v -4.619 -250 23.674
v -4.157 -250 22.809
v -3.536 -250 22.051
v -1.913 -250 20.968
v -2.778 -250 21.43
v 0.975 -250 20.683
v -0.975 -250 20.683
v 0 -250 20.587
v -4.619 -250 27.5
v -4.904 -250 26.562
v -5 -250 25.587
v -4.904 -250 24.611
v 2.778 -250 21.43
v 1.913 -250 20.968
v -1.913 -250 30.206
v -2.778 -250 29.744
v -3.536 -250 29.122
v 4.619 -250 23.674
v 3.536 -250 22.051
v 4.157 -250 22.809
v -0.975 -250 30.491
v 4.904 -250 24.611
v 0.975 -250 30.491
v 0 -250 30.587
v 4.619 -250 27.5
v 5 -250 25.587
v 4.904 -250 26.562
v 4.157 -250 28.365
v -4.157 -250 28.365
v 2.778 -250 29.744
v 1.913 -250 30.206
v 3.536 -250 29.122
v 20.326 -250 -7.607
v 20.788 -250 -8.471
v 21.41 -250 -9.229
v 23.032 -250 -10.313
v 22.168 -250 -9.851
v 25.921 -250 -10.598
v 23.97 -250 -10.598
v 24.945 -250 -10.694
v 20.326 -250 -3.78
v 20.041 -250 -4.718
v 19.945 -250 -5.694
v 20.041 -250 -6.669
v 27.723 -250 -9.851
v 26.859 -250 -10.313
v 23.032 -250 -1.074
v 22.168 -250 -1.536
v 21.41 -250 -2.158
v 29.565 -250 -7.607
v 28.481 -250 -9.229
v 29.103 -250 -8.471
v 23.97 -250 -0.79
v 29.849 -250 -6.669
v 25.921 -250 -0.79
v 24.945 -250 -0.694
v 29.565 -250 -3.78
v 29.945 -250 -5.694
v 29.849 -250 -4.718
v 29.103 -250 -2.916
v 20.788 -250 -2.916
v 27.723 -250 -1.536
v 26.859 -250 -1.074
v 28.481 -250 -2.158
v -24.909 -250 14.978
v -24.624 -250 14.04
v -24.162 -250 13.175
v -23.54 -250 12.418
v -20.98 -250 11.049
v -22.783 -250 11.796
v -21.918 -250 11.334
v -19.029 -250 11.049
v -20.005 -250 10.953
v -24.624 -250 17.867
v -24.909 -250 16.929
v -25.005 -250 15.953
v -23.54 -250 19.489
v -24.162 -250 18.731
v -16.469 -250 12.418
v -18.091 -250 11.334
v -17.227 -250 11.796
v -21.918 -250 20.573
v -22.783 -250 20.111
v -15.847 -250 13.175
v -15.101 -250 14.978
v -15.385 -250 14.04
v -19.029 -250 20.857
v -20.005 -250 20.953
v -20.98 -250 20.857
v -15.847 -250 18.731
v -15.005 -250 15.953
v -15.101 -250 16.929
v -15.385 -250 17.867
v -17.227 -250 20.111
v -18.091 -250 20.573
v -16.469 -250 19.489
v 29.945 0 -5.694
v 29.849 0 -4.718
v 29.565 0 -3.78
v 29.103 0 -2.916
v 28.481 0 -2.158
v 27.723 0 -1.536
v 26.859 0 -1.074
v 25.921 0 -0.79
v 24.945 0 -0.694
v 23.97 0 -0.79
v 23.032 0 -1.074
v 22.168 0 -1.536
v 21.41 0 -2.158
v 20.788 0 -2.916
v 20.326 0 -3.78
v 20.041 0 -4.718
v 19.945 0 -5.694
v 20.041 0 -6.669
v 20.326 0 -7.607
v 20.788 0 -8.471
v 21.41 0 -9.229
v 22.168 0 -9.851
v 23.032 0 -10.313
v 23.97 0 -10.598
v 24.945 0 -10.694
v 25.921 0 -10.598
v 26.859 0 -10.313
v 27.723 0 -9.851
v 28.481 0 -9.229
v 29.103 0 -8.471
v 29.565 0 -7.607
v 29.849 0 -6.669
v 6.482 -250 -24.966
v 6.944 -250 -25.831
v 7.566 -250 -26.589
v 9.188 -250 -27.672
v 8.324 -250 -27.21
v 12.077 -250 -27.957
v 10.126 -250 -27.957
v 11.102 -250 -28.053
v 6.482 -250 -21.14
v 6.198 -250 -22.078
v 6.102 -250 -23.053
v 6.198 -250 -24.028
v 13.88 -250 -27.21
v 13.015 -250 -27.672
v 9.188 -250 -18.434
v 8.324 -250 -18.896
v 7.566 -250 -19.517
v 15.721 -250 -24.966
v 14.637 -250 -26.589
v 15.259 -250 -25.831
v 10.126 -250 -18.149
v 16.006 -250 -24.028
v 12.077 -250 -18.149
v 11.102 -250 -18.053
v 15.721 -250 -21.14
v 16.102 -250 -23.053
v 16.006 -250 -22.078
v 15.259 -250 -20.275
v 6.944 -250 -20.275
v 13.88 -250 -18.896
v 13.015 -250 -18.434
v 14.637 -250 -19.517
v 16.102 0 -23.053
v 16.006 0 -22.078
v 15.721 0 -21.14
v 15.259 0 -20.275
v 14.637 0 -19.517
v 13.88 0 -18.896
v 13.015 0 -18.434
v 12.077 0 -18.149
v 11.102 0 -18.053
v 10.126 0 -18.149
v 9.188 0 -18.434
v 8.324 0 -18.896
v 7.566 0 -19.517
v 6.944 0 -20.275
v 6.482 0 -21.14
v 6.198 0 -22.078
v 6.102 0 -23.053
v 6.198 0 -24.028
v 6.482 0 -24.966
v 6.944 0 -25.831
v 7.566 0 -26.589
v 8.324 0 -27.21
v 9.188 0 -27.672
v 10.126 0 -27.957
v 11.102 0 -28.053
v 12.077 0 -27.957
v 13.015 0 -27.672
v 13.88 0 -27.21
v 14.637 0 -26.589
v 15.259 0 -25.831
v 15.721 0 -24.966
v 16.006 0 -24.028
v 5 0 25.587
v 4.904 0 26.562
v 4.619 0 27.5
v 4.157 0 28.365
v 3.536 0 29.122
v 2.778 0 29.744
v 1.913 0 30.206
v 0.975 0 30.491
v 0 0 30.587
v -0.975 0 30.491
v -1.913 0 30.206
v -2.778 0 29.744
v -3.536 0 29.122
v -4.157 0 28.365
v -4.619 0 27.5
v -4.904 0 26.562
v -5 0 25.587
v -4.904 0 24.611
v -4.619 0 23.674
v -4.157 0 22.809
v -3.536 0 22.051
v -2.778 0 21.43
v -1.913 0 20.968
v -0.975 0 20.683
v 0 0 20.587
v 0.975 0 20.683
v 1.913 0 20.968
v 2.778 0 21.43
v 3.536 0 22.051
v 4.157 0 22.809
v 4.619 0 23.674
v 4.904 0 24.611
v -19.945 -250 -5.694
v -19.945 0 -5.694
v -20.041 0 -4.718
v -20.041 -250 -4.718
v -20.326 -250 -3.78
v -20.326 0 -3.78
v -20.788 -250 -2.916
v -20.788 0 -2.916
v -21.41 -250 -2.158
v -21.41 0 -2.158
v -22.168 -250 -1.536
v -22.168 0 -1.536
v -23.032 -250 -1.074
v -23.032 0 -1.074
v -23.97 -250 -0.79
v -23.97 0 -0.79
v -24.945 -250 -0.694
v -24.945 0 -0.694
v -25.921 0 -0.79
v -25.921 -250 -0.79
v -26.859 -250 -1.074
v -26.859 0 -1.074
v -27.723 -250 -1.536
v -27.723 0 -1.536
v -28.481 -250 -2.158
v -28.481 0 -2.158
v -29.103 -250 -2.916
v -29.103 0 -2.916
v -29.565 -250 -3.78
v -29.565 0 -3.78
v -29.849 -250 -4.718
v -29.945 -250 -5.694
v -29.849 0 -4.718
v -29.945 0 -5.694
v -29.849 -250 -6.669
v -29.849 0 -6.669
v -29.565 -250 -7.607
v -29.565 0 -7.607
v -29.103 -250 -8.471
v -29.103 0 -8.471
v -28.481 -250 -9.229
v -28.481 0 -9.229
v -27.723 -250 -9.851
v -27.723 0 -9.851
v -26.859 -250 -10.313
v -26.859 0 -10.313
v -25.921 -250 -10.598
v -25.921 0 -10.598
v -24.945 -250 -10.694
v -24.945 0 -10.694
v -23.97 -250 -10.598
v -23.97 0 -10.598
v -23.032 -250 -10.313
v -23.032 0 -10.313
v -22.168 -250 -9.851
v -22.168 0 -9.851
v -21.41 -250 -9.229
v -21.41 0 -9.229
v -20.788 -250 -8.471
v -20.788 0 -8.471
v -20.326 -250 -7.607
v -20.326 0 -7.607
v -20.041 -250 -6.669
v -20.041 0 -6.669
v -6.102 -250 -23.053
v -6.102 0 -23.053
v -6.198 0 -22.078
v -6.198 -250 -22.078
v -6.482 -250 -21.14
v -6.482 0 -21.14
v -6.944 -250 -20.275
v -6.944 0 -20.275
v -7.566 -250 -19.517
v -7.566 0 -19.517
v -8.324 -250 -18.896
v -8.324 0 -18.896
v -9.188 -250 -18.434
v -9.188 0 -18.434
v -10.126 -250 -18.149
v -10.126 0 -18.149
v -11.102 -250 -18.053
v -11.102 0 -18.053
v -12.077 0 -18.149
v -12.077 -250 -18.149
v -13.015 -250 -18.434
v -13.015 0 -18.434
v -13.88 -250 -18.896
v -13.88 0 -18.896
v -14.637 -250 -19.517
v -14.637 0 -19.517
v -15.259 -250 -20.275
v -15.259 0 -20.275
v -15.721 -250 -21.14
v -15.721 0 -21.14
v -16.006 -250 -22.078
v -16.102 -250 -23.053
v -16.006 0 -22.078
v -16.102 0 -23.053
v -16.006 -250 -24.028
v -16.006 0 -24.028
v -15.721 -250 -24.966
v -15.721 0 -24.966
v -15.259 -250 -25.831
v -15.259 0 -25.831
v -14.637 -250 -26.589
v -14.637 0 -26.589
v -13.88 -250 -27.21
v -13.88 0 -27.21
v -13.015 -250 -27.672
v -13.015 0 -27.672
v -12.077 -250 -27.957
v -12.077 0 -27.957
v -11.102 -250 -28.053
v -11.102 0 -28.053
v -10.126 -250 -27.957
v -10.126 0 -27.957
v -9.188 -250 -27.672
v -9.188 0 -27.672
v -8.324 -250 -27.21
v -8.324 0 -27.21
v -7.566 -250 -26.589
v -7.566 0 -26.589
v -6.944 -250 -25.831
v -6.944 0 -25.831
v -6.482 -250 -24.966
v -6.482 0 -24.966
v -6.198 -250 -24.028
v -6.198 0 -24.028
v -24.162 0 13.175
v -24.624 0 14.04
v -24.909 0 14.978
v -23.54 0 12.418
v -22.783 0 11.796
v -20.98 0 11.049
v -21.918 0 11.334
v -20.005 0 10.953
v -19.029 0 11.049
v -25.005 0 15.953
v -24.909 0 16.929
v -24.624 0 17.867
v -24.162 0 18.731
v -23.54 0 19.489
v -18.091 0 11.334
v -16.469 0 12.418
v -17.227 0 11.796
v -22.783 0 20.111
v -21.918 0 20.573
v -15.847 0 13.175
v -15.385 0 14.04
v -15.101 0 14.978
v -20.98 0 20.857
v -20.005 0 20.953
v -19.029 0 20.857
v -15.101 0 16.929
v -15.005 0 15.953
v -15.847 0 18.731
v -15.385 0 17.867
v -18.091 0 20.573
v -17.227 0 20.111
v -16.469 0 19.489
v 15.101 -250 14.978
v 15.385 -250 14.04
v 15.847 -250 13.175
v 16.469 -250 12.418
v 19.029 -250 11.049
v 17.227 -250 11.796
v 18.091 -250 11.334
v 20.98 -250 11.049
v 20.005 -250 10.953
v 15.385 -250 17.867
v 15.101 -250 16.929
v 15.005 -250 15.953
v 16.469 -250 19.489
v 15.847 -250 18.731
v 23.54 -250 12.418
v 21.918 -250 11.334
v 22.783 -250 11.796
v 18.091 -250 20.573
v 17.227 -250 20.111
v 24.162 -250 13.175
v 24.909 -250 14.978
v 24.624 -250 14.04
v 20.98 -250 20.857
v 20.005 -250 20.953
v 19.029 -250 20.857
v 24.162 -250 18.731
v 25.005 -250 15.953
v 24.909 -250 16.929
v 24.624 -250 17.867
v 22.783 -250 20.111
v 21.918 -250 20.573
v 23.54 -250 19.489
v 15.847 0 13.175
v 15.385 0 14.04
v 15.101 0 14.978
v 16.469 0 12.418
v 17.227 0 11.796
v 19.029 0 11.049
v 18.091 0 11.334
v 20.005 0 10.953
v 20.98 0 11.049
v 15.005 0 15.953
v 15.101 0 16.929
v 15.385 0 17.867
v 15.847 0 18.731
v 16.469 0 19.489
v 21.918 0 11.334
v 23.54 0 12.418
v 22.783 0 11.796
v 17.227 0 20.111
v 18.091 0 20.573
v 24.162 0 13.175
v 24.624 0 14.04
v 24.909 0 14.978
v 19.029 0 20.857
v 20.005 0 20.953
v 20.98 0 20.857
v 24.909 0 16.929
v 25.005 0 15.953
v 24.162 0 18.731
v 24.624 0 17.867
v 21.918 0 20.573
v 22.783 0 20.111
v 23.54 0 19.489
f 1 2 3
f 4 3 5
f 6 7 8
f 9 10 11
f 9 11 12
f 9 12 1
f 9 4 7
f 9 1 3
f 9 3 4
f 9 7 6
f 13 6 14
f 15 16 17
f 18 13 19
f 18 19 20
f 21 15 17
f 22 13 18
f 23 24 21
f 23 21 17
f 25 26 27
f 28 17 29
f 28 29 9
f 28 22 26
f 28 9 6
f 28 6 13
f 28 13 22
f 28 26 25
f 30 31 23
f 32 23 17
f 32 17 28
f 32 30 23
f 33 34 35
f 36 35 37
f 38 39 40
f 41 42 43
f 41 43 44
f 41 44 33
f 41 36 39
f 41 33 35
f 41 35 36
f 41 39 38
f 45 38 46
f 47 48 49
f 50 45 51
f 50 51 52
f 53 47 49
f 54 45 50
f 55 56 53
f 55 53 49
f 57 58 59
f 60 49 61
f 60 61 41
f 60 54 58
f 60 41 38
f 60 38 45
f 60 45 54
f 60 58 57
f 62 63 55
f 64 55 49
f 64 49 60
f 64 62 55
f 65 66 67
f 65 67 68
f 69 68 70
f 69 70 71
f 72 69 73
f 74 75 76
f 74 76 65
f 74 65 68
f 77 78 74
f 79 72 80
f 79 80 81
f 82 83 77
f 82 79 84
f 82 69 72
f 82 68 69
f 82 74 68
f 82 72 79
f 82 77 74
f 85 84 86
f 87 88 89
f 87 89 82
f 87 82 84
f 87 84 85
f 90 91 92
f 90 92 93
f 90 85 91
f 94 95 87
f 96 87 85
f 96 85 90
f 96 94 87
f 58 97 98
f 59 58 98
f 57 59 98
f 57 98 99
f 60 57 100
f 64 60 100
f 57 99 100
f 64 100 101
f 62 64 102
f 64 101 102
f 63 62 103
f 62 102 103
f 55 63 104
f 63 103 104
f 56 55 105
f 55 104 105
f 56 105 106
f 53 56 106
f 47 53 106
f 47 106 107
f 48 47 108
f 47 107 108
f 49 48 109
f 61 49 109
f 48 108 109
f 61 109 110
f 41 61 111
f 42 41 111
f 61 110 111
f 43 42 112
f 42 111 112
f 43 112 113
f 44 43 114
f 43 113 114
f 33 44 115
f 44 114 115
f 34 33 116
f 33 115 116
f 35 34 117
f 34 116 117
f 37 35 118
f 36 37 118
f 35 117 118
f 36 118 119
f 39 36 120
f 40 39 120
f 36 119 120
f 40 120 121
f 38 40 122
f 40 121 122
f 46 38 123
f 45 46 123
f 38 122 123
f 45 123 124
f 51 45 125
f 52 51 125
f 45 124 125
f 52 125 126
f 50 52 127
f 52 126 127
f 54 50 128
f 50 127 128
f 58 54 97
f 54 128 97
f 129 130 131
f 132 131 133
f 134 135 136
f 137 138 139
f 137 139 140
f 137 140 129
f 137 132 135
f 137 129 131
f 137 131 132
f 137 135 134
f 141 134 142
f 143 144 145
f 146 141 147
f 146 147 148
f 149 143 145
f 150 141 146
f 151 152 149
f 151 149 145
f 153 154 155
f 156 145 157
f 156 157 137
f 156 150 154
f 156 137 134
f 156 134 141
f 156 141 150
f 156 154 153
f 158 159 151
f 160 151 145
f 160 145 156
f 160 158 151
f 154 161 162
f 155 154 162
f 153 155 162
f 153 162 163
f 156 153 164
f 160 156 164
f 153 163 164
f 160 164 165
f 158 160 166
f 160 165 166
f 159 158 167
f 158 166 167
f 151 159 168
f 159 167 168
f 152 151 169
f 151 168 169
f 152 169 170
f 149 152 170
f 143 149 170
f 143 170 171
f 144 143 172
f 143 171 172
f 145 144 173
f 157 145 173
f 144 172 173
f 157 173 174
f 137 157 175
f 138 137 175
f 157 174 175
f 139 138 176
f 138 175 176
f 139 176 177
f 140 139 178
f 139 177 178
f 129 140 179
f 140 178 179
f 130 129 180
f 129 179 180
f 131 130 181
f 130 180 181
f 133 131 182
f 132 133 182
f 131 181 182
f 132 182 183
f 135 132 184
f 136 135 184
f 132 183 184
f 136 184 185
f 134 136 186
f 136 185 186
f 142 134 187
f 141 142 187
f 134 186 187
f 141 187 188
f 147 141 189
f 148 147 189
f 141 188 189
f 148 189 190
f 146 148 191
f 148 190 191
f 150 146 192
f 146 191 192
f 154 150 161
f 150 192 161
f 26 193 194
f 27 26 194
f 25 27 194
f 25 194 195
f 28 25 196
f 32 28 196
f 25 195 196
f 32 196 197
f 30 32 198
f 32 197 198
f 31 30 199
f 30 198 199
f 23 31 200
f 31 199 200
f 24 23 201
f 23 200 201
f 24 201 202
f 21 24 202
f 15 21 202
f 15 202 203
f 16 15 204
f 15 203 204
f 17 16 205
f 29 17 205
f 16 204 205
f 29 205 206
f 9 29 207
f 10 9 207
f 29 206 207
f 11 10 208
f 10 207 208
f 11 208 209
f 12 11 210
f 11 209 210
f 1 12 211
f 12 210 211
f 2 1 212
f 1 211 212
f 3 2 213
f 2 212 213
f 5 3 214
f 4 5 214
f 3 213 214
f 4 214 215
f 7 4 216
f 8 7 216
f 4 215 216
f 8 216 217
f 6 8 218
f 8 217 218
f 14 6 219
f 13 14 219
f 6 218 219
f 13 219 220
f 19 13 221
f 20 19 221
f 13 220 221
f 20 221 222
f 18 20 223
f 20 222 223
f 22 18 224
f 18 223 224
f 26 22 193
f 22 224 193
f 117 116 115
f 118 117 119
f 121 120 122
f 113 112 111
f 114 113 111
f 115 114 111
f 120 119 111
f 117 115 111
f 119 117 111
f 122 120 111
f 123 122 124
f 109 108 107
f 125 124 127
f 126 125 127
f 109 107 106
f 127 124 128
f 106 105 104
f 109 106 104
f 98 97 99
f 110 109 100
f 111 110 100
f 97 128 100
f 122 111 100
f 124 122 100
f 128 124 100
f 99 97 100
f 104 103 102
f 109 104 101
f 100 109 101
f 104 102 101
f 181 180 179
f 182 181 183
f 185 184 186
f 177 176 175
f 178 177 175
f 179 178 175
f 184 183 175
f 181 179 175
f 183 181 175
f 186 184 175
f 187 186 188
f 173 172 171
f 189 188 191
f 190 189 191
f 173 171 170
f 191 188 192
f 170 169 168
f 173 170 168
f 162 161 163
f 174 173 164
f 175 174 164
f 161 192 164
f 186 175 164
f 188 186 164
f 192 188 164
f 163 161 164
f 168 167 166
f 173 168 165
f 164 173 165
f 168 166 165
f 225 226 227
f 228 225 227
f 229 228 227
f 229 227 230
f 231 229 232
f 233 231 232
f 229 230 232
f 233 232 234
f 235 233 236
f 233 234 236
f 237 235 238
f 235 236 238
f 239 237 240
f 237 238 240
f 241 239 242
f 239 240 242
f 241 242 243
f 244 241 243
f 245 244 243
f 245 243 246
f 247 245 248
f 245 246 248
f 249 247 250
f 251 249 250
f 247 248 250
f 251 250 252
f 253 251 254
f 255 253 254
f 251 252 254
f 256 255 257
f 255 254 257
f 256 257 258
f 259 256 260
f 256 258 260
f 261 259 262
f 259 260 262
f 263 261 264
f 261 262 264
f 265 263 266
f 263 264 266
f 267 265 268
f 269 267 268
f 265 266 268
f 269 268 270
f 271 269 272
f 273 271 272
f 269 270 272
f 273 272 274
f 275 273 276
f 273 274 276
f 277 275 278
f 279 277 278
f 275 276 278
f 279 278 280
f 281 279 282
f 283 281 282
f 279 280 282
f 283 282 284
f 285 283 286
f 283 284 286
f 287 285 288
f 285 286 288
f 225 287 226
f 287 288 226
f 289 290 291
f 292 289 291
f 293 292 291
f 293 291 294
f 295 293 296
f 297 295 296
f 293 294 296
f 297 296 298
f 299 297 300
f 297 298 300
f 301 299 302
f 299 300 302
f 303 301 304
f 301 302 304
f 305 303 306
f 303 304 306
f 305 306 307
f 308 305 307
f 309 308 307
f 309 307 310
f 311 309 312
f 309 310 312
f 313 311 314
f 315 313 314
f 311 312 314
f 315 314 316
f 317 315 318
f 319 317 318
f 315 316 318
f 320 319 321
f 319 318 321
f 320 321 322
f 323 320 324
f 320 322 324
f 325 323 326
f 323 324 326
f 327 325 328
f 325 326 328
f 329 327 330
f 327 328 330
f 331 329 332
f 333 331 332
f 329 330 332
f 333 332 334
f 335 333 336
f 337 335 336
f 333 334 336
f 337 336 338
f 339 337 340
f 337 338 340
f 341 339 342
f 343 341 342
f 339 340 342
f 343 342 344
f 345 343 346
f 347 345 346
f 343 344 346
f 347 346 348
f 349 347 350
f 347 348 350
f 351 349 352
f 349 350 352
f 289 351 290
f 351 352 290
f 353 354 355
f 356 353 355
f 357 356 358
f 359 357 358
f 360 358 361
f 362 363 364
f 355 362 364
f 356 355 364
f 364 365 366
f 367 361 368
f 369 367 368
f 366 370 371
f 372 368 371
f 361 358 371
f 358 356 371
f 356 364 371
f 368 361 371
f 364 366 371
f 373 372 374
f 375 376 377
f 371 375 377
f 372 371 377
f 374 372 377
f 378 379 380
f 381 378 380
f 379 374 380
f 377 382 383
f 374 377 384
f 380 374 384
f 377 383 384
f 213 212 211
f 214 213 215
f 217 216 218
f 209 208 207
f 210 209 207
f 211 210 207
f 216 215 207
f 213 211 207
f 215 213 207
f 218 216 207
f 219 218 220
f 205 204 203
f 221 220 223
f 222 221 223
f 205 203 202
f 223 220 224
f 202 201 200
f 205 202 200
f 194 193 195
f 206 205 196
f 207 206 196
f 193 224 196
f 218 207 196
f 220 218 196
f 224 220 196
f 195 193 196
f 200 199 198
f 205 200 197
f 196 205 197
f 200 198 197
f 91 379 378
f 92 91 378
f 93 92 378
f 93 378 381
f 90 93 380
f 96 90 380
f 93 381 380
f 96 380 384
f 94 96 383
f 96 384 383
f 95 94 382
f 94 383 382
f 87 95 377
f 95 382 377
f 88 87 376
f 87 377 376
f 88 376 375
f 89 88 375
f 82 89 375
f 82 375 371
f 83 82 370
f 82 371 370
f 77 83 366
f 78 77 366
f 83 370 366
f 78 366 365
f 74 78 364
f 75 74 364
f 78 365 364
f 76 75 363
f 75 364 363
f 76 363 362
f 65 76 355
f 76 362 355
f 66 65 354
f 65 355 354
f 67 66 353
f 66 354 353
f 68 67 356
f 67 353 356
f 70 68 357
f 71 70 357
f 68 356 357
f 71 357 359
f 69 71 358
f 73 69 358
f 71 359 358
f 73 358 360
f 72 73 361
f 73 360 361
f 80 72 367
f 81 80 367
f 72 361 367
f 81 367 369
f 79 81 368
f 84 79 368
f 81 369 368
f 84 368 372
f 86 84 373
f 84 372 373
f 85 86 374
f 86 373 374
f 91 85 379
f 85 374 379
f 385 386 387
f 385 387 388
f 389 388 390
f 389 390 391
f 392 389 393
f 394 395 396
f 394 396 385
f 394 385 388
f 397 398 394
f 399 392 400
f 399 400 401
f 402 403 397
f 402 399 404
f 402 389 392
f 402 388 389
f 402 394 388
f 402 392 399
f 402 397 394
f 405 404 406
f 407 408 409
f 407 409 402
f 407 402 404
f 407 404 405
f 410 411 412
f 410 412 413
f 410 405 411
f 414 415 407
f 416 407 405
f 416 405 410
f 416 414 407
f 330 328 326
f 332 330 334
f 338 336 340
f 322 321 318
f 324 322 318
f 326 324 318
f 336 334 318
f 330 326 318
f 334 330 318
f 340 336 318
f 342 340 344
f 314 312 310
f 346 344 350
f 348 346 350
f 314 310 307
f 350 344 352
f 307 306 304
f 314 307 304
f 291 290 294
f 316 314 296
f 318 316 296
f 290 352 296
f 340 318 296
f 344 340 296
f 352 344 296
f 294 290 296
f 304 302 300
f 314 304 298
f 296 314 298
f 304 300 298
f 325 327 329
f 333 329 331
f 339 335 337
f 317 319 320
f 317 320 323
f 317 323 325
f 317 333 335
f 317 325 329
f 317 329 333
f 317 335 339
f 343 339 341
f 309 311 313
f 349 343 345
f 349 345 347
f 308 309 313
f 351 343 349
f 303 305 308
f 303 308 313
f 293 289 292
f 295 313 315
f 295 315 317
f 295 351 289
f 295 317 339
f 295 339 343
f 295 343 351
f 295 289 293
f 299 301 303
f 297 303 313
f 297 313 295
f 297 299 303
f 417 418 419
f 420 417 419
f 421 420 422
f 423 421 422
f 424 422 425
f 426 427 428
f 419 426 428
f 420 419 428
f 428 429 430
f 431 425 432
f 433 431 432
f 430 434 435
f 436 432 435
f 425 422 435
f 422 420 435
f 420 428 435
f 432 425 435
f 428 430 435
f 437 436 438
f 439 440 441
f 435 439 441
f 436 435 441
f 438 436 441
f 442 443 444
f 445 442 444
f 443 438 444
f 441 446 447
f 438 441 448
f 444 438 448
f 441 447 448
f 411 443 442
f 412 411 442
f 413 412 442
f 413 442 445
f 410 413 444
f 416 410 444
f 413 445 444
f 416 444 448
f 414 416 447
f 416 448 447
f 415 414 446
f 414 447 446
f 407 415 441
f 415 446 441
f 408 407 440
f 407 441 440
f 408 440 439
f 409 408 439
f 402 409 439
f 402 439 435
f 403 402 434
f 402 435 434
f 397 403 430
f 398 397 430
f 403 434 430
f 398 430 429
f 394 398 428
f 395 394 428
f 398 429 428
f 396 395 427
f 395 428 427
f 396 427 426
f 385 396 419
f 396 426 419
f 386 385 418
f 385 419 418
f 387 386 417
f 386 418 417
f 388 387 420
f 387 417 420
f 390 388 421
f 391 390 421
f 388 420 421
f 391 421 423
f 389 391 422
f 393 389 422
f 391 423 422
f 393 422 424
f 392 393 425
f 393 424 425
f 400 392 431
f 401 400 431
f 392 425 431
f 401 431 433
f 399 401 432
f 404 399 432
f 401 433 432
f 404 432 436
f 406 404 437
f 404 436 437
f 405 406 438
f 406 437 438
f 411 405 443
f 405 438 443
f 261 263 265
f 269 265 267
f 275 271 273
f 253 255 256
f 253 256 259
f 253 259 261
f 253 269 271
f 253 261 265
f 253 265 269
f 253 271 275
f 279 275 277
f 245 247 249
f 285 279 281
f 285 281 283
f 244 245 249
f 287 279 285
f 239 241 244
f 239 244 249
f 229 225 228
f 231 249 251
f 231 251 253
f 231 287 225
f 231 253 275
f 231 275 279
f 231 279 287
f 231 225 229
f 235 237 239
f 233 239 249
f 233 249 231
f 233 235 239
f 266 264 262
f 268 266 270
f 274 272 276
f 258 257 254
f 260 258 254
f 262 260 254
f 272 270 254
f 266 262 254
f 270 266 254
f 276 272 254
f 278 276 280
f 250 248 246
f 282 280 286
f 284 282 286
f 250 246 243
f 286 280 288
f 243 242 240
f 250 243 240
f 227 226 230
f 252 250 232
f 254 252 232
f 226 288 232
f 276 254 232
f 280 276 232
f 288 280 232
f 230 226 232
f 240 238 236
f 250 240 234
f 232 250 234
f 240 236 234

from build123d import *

# Parameters (mm, degrees)
F0_R     = 5
F1_DEPTH = 250


with BuildPart() as f1:
    # F0 (on Front) → F1 (new body)
    with BuildSketch(Plane.XZ):
        with Locations((0, 25.586935)):
            Circle(F0_R)
        with Locations((20.004672, 15.953193)):
            Circle(F0_R)
        with Locations((24.945417, -5.693629)):
            Circle(F0_R)
        with Locations((11.101755, -23.053032)):
            Circle(F0_R)
        with Locations((-11.101755, -23.053032)):
            Circle(F0_R)
        with Locations((-24.945417, -5.693629)):
            Circle(F0_R)
        with Locations((-20.004672, 15.953193)):
            Circle(F0_R)
    extrude(amount=F1_DEPTH)


solid = f1.part
